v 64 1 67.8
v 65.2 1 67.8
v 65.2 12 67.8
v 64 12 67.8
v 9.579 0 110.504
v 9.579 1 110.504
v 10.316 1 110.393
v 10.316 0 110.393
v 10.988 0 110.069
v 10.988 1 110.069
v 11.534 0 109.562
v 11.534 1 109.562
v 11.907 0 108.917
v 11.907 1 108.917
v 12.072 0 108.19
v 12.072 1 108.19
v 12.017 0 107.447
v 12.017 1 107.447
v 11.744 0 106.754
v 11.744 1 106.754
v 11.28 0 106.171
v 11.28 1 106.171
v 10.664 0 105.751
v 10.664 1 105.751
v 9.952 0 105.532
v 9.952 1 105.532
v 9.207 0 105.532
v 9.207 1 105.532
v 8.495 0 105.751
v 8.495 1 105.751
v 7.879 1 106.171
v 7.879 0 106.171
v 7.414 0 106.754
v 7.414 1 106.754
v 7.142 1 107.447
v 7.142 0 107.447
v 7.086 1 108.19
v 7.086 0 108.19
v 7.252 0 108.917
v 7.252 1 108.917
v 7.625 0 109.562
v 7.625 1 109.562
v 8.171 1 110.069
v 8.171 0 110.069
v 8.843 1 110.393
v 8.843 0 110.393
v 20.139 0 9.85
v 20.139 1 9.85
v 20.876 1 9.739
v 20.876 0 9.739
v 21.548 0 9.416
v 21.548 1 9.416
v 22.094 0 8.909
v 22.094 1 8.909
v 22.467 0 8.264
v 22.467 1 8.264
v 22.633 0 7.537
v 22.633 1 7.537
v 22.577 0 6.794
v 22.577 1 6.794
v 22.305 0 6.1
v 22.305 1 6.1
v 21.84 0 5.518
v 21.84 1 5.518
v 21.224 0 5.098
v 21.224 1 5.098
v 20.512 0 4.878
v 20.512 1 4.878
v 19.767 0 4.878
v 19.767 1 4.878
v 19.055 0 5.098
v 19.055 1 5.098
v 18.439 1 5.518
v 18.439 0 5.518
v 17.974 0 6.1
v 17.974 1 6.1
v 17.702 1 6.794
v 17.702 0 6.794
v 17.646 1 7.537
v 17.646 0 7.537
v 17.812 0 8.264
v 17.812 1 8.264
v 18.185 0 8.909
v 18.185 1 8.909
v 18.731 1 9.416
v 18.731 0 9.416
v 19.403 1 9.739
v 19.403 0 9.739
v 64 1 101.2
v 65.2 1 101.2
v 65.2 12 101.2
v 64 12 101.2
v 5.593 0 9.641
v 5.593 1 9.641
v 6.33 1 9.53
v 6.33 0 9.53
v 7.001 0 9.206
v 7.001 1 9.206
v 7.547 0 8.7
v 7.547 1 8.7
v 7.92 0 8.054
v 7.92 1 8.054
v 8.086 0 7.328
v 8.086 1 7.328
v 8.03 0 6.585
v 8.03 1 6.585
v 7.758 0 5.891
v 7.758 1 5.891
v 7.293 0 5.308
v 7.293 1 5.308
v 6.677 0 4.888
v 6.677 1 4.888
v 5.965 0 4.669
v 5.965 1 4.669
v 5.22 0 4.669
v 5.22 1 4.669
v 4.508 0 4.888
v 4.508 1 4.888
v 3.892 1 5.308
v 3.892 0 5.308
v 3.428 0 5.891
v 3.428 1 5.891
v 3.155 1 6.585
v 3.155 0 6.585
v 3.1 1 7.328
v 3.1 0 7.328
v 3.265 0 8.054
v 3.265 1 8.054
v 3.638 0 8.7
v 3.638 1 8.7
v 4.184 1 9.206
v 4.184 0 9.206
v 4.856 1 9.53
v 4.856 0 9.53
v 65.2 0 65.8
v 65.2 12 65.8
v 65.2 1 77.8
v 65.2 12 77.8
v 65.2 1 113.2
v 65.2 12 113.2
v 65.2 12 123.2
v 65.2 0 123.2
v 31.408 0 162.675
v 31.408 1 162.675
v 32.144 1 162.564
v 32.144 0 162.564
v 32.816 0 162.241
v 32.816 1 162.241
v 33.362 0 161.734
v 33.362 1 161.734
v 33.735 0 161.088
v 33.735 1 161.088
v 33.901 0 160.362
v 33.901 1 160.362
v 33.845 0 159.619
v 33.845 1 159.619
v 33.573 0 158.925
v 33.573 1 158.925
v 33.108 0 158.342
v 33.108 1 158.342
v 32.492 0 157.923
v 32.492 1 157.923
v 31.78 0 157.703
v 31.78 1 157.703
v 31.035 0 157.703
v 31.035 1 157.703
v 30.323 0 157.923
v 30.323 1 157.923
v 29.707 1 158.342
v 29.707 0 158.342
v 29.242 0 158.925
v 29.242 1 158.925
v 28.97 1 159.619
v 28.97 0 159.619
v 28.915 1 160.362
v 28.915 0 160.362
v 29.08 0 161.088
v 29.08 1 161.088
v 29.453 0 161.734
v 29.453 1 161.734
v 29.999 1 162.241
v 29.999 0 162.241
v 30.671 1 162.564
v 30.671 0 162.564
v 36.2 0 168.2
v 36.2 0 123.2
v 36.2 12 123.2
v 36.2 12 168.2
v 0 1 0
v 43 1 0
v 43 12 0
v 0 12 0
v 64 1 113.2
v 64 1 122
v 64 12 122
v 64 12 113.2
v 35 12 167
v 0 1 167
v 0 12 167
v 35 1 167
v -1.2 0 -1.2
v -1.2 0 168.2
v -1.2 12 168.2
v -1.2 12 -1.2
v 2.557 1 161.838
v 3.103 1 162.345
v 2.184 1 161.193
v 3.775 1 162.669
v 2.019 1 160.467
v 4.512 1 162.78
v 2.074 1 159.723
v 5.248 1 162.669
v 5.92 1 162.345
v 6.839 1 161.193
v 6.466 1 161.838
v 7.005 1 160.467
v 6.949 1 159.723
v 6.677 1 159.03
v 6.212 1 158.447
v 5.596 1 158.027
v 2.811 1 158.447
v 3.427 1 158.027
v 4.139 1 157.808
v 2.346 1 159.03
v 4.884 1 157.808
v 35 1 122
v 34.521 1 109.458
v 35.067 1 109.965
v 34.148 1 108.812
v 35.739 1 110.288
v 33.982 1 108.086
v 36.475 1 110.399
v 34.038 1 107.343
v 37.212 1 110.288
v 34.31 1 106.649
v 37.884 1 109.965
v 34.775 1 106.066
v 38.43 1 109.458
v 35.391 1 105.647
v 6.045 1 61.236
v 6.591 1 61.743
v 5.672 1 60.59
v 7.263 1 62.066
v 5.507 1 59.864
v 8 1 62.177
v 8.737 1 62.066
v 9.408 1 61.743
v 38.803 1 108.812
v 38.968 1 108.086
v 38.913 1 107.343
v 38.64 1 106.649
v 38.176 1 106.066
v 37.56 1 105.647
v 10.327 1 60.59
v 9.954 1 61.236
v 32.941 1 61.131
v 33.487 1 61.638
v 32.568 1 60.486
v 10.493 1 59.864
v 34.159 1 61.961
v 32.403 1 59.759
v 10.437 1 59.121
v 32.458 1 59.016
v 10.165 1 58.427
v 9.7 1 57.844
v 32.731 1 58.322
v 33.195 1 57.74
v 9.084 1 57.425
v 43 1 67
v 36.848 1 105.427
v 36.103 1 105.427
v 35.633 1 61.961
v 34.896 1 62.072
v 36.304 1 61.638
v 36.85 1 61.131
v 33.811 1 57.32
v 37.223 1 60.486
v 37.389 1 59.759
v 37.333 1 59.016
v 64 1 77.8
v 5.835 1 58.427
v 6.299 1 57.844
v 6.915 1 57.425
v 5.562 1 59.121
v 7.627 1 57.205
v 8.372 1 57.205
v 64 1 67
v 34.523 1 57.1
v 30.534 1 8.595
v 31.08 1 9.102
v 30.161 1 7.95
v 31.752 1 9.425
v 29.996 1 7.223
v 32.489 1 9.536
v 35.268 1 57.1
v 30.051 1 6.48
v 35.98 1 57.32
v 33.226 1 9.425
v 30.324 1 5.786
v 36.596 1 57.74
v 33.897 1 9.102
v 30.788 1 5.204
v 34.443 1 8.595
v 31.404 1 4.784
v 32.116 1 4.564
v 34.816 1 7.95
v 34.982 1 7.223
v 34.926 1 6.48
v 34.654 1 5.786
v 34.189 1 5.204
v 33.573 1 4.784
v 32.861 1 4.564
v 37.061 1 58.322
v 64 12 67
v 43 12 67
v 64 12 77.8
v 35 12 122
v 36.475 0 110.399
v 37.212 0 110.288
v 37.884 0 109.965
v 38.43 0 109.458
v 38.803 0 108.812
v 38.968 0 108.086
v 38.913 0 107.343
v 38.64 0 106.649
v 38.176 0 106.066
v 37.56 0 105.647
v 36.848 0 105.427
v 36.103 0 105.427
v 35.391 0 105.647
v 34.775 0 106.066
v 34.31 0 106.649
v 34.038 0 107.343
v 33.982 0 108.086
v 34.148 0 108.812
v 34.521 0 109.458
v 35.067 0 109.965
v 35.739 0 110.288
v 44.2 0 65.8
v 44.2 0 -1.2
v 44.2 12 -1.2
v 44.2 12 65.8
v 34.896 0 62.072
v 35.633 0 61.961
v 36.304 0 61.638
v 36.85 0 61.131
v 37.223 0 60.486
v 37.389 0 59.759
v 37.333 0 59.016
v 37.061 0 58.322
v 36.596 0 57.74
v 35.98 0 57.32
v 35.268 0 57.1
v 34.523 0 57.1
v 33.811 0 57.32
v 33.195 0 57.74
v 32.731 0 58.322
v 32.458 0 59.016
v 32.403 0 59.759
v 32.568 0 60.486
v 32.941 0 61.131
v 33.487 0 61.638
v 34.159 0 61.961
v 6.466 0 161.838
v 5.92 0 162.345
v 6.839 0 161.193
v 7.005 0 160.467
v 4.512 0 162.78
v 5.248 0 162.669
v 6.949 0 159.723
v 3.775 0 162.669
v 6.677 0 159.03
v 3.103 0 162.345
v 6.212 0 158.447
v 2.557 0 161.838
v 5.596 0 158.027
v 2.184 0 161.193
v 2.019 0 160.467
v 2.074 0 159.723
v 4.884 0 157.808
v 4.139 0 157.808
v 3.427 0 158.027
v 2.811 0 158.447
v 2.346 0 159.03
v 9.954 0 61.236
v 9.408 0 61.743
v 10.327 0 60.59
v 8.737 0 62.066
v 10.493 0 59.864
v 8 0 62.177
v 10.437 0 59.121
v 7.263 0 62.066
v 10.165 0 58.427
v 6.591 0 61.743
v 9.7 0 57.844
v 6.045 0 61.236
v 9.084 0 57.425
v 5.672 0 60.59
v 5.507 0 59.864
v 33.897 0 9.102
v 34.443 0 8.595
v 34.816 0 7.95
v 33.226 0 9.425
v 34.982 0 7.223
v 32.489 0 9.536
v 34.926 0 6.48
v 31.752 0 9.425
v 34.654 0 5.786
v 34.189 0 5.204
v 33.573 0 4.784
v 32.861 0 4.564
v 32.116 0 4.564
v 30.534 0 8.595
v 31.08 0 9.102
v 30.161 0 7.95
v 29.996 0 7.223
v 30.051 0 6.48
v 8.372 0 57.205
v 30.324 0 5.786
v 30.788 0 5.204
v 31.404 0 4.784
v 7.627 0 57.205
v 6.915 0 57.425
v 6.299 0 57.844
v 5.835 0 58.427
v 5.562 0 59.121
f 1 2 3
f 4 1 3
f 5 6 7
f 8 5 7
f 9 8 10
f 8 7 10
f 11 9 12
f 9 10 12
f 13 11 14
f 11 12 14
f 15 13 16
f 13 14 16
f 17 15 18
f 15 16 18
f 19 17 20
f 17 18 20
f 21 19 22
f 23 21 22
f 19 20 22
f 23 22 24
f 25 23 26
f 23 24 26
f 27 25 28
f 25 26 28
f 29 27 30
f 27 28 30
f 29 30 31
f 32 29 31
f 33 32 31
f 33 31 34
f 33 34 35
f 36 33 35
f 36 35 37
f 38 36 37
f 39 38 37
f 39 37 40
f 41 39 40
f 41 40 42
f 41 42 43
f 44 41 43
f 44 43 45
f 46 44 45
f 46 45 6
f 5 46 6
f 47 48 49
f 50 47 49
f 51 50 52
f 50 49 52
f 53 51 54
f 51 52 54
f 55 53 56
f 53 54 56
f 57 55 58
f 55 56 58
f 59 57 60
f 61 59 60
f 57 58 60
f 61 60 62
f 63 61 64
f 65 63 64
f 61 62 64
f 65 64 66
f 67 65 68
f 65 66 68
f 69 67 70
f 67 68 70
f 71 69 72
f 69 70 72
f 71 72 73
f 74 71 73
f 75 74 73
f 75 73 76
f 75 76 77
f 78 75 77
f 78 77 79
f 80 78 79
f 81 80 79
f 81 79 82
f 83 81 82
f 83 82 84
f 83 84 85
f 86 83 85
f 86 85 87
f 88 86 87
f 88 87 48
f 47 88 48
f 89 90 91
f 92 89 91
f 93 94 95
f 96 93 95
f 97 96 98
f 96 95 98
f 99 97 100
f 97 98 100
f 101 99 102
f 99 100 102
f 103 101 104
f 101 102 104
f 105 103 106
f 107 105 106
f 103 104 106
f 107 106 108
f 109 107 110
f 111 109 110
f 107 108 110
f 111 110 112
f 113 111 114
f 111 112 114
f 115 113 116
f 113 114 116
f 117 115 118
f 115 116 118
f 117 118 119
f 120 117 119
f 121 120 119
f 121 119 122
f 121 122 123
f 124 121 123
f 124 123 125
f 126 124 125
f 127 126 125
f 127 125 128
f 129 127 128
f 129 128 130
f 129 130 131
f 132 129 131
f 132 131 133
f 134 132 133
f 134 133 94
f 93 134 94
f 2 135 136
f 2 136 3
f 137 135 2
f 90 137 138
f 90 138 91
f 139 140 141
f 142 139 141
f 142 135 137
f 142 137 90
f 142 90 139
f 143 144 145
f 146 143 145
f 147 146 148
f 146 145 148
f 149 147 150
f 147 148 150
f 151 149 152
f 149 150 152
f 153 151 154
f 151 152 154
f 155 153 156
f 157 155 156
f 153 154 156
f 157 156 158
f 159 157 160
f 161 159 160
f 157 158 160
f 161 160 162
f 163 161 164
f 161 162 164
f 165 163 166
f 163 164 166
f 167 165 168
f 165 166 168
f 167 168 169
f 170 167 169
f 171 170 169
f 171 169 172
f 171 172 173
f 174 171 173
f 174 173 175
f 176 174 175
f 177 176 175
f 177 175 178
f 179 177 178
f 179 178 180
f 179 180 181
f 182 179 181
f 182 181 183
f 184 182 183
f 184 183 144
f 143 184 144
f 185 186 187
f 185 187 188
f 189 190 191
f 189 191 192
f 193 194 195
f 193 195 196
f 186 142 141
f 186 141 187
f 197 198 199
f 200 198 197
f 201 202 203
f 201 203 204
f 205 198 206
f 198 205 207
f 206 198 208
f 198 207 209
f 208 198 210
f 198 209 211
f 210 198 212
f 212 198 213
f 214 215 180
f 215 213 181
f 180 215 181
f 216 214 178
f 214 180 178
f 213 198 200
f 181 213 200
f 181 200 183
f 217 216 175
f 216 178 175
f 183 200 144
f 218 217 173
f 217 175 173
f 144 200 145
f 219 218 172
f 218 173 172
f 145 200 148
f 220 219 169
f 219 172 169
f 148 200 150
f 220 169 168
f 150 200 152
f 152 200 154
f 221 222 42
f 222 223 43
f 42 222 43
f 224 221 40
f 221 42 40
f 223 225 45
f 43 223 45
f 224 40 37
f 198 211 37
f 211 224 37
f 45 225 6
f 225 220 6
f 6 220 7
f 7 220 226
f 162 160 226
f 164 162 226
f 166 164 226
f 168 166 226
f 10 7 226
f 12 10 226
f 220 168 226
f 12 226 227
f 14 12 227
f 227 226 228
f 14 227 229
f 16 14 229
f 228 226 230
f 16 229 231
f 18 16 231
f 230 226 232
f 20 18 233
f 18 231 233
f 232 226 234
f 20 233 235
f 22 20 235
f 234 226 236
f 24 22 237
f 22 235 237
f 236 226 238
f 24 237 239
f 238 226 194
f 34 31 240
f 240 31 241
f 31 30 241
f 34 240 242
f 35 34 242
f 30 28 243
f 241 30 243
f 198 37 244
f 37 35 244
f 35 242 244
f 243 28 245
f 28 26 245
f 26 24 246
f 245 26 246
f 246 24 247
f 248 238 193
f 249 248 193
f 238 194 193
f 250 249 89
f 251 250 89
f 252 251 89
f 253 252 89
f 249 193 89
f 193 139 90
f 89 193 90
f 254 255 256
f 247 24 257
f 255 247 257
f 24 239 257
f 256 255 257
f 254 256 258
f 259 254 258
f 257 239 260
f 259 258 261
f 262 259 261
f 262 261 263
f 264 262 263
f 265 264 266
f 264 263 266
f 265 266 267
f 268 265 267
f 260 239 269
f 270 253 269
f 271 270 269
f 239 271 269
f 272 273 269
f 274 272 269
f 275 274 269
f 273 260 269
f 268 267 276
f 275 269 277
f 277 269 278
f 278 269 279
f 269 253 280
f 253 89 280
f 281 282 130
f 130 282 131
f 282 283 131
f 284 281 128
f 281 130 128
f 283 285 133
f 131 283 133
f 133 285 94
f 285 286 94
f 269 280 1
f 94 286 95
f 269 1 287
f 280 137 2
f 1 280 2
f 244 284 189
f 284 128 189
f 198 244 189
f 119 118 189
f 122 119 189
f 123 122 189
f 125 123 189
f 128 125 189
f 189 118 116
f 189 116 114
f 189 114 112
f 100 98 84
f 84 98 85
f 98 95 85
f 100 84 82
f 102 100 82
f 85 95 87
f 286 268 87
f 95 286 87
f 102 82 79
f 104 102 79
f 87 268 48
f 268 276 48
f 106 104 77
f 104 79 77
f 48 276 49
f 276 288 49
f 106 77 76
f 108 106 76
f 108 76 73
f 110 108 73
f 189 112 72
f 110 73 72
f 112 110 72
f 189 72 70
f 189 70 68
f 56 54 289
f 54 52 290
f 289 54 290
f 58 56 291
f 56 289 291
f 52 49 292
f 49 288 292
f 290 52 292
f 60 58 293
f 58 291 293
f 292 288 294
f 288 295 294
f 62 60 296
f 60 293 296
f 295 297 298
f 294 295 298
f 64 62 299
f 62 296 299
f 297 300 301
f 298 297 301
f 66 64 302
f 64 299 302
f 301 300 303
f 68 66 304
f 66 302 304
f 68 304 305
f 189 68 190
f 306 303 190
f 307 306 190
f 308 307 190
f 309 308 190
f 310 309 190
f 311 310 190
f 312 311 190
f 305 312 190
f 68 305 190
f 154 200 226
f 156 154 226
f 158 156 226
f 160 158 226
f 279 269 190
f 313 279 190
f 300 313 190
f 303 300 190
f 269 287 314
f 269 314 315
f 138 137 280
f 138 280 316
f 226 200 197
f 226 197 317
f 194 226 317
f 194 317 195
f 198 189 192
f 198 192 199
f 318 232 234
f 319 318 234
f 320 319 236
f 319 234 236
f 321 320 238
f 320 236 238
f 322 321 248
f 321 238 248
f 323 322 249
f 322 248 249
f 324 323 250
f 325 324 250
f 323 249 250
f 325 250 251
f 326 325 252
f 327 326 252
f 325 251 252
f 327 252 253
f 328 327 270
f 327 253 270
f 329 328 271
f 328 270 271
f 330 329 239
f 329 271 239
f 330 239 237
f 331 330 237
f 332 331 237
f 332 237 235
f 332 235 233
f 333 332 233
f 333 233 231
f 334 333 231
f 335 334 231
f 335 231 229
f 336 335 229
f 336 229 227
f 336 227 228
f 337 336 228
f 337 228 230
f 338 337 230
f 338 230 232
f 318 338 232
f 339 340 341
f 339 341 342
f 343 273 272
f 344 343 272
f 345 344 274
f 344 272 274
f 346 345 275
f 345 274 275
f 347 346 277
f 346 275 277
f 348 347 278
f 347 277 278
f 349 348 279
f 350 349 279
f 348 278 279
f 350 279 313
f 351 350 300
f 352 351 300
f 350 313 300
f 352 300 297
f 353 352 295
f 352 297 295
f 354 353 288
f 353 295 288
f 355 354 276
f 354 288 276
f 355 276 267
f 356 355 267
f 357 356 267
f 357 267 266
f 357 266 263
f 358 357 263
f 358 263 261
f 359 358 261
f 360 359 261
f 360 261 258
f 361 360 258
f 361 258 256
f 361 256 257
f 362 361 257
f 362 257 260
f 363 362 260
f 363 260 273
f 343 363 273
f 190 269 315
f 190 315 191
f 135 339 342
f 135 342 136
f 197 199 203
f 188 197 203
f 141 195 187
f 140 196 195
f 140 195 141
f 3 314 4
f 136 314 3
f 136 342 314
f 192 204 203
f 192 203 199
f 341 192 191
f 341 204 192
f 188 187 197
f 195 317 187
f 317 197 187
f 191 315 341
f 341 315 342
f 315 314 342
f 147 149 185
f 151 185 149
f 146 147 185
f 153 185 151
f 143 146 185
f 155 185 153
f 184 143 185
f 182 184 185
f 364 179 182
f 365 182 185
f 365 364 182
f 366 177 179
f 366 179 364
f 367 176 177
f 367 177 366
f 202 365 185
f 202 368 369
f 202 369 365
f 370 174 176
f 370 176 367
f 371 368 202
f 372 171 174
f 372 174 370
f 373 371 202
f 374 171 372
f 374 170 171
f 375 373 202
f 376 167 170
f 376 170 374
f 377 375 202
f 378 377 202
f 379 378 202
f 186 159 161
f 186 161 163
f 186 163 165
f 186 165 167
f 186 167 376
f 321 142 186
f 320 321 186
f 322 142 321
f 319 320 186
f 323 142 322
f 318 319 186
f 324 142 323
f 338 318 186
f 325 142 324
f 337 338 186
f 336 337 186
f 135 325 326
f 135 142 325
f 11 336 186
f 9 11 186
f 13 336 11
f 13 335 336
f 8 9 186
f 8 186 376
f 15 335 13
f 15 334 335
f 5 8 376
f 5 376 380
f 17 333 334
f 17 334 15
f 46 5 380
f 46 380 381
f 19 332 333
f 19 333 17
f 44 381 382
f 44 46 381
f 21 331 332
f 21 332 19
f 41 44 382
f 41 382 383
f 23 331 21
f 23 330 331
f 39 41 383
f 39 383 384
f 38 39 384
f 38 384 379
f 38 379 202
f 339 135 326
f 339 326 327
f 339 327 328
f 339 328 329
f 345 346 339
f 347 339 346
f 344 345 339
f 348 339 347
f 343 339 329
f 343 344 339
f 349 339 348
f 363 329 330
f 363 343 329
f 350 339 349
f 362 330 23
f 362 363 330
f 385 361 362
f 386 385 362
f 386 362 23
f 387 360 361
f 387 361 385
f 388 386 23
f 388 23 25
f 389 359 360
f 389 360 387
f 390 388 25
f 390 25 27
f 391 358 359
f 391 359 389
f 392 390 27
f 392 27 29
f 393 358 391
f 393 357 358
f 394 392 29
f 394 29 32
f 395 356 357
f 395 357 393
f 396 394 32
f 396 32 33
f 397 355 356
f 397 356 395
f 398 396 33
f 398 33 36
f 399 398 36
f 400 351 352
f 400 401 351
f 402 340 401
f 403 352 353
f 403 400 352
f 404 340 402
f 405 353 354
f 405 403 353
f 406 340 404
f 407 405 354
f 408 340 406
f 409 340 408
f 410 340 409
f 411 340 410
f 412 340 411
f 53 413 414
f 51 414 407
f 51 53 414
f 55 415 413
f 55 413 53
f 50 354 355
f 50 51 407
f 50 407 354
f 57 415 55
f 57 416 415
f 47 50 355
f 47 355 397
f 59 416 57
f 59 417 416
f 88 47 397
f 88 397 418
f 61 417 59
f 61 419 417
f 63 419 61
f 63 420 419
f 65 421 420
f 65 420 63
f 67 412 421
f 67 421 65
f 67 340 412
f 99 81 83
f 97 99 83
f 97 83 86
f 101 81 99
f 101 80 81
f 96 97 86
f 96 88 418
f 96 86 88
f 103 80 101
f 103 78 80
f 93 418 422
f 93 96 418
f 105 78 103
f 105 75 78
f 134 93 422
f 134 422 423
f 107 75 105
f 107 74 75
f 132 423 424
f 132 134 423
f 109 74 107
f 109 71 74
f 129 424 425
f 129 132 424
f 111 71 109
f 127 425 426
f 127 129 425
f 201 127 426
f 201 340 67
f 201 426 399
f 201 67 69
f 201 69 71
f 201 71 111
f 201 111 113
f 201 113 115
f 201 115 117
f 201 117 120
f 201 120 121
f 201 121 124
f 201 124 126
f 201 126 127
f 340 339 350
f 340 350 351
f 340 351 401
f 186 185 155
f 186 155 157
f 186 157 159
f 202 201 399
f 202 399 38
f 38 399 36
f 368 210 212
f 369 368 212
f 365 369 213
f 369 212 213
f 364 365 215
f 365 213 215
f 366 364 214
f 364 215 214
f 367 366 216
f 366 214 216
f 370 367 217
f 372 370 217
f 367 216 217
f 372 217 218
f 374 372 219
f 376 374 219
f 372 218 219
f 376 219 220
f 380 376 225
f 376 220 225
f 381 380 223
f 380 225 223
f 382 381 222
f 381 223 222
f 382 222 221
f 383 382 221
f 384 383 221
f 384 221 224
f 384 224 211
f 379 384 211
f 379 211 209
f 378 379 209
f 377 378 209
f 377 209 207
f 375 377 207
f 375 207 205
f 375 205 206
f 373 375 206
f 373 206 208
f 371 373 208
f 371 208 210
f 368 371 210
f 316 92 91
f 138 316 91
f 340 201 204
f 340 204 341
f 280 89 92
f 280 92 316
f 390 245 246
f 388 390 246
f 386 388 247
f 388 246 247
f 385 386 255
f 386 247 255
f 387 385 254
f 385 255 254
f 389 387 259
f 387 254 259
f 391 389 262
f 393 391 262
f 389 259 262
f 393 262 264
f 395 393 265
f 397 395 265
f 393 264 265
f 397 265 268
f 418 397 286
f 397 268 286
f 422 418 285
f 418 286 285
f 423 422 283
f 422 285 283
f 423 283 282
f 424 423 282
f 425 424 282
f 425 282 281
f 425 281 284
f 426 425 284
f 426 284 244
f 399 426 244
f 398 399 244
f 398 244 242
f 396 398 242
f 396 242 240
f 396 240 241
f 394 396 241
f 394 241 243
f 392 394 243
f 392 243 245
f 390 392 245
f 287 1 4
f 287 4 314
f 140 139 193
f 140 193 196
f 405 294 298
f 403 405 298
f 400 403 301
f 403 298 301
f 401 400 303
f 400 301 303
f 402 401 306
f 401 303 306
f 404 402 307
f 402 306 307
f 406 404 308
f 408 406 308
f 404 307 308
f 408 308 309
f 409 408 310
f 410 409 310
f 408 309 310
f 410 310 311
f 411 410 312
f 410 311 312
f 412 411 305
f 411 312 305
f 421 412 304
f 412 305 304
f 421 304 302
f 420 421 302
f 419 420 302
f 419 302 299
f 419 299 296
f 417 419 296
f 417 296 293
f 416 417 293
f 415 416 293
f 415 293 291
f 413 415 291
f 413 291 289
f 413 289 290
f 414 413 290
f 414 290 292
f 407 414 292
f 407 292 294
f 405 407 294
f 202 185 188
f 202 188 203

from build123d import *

# Parameters (mm, degrees)
BOSS_EXTRUDE1_DEPTH = 1
BOSS_EXTRUDE2_DEPTH = 12
SKETCH2_W           = 10
SKETCH2_H           = 11
SKETCH2_W_2         = 12
CUT_EXTRUDE1_DEPTH  = 12
SKETCH3_R           = 2.5
CUT_EXTRUDE2_DEPTH  = 12


with BuildPart() as part:
    # Sketch1 → Boss-Extrude1 (new body)
    with BuildSketch(Plane(origin=(0, 0, 0), x_dir=(1, 0, 0), z_dir=(0, 1, 0))):
        Polygon((-1.2, 1.2), (44.2, 1.2), (44.2, -65.8), (65.2, -65.8), (65.2, -123.2), (36.2, -123.2), (36.2, -168.2), (-1.2, -168.2), align=None)
        Polygon((0, -167), (35, -167), (35, -122), (64, -122), (64, -67), (43, -67), (43, 0), (0, 0), align=None, mode=Mode.SUBTRACT)
        Polygon((0, 0), (0, -167), (35, -167), (35, -122), (64, -122), (64, -67), (43, -67), (43, 0), align=None)
    extrude(amount=BOSS_EXTRUDE1_DEPTH)

    # Sketch1<3> → Boss-Extrude2 (add)
    with BuildSketch(Plane(origin=(0, 0, 0), x_dir=(1, 0, 0), z_dir=(0, 1, 0))):
        Polygon((-1.2, 1.2), (-1.2, -168.2), (36.2, -168.2), (36.2, -123.2), (65.2, -123.2), (65.2, -65.8), (44.2, -65.8), (44.2, 1.2), align=None)
        Polygon((0, 0), (0, -167), (35, -167), (35, -122), (64, -122), (64, -67), (43, -67), (43, 0), align=None, mode=Mode.SUBTRACT)
    extrude(amount=BOSS_EXTRUDE2_DEPTH)

    # Sketch2 → Cut-Extrude1 (cut)
    with BuildSketch(Plane(origin=(65.2, 0, 0), x_dir=(0, 0, -1), z_dir=(1, 0, 0))):
        with Locations((-72.8, 6.5)):
            Rectangle(SKETCH2_W, SKETCH2_H)
        with Locations((-107.2, 6.5)):
            Rectangle(SKETCH2_W_2, SKETCH2_H)
    extrude(amount=-CUT_EXTRUDE1_DEPTH, mode=Mode.SUBTRACT)

    # Sketch3 → Cut-Extrude2 (cut)
    with BuildSketch(Plane(origin=(0, 1, 0), x_dir=(1, 0, 0), z_dir=(0, 1, 0))):
        with Locations(Location((5.592629817, -7.1408635, 0), (0, 0, 270))):
            Circle(SKETCH3_R)
        with Locations(Location((20.139491033, -7.350170855, 0), (0, 0, 270))):
            Circle(SKETCH3_R)
        with Locations(Location((32.488625014, -7.036209822, 0), (0, 0, 270))):
            Circle(SKETCH3_R)
        with Locations(Location((7.999664407, -59.67700976, 0), (0, 0, 270))):
            Circle(SKETCH3_R)
        with Locations(Location((34.895659604, -59.572356082, 0), (0, 0, 270))):
            Circle(SKETCH3_R)
        with Locations(Location((9.579399834, -108.003673304, 0), (0, 0, 270))):
            Circle(SKETCH3_R)
        with Locations(Location((36.475395031, -107.899019626, 0), (0, 0, 270))):
            Circle(SKETCH3_R)
        with Locations(Location((4.511546122, -160.279750326, 0), (0, 0, 270))):
            Circle(SKETCH3_R)
        with Locations(Location((31.407541319, -160.175096649, 0), (0, 0, 270))):
            Circle(SKETCH3_R)
    extrude(amount=-CUT_EXTRUDE2_DEPTH, mode=Mode.SUBTRACT)


solid = part.part
